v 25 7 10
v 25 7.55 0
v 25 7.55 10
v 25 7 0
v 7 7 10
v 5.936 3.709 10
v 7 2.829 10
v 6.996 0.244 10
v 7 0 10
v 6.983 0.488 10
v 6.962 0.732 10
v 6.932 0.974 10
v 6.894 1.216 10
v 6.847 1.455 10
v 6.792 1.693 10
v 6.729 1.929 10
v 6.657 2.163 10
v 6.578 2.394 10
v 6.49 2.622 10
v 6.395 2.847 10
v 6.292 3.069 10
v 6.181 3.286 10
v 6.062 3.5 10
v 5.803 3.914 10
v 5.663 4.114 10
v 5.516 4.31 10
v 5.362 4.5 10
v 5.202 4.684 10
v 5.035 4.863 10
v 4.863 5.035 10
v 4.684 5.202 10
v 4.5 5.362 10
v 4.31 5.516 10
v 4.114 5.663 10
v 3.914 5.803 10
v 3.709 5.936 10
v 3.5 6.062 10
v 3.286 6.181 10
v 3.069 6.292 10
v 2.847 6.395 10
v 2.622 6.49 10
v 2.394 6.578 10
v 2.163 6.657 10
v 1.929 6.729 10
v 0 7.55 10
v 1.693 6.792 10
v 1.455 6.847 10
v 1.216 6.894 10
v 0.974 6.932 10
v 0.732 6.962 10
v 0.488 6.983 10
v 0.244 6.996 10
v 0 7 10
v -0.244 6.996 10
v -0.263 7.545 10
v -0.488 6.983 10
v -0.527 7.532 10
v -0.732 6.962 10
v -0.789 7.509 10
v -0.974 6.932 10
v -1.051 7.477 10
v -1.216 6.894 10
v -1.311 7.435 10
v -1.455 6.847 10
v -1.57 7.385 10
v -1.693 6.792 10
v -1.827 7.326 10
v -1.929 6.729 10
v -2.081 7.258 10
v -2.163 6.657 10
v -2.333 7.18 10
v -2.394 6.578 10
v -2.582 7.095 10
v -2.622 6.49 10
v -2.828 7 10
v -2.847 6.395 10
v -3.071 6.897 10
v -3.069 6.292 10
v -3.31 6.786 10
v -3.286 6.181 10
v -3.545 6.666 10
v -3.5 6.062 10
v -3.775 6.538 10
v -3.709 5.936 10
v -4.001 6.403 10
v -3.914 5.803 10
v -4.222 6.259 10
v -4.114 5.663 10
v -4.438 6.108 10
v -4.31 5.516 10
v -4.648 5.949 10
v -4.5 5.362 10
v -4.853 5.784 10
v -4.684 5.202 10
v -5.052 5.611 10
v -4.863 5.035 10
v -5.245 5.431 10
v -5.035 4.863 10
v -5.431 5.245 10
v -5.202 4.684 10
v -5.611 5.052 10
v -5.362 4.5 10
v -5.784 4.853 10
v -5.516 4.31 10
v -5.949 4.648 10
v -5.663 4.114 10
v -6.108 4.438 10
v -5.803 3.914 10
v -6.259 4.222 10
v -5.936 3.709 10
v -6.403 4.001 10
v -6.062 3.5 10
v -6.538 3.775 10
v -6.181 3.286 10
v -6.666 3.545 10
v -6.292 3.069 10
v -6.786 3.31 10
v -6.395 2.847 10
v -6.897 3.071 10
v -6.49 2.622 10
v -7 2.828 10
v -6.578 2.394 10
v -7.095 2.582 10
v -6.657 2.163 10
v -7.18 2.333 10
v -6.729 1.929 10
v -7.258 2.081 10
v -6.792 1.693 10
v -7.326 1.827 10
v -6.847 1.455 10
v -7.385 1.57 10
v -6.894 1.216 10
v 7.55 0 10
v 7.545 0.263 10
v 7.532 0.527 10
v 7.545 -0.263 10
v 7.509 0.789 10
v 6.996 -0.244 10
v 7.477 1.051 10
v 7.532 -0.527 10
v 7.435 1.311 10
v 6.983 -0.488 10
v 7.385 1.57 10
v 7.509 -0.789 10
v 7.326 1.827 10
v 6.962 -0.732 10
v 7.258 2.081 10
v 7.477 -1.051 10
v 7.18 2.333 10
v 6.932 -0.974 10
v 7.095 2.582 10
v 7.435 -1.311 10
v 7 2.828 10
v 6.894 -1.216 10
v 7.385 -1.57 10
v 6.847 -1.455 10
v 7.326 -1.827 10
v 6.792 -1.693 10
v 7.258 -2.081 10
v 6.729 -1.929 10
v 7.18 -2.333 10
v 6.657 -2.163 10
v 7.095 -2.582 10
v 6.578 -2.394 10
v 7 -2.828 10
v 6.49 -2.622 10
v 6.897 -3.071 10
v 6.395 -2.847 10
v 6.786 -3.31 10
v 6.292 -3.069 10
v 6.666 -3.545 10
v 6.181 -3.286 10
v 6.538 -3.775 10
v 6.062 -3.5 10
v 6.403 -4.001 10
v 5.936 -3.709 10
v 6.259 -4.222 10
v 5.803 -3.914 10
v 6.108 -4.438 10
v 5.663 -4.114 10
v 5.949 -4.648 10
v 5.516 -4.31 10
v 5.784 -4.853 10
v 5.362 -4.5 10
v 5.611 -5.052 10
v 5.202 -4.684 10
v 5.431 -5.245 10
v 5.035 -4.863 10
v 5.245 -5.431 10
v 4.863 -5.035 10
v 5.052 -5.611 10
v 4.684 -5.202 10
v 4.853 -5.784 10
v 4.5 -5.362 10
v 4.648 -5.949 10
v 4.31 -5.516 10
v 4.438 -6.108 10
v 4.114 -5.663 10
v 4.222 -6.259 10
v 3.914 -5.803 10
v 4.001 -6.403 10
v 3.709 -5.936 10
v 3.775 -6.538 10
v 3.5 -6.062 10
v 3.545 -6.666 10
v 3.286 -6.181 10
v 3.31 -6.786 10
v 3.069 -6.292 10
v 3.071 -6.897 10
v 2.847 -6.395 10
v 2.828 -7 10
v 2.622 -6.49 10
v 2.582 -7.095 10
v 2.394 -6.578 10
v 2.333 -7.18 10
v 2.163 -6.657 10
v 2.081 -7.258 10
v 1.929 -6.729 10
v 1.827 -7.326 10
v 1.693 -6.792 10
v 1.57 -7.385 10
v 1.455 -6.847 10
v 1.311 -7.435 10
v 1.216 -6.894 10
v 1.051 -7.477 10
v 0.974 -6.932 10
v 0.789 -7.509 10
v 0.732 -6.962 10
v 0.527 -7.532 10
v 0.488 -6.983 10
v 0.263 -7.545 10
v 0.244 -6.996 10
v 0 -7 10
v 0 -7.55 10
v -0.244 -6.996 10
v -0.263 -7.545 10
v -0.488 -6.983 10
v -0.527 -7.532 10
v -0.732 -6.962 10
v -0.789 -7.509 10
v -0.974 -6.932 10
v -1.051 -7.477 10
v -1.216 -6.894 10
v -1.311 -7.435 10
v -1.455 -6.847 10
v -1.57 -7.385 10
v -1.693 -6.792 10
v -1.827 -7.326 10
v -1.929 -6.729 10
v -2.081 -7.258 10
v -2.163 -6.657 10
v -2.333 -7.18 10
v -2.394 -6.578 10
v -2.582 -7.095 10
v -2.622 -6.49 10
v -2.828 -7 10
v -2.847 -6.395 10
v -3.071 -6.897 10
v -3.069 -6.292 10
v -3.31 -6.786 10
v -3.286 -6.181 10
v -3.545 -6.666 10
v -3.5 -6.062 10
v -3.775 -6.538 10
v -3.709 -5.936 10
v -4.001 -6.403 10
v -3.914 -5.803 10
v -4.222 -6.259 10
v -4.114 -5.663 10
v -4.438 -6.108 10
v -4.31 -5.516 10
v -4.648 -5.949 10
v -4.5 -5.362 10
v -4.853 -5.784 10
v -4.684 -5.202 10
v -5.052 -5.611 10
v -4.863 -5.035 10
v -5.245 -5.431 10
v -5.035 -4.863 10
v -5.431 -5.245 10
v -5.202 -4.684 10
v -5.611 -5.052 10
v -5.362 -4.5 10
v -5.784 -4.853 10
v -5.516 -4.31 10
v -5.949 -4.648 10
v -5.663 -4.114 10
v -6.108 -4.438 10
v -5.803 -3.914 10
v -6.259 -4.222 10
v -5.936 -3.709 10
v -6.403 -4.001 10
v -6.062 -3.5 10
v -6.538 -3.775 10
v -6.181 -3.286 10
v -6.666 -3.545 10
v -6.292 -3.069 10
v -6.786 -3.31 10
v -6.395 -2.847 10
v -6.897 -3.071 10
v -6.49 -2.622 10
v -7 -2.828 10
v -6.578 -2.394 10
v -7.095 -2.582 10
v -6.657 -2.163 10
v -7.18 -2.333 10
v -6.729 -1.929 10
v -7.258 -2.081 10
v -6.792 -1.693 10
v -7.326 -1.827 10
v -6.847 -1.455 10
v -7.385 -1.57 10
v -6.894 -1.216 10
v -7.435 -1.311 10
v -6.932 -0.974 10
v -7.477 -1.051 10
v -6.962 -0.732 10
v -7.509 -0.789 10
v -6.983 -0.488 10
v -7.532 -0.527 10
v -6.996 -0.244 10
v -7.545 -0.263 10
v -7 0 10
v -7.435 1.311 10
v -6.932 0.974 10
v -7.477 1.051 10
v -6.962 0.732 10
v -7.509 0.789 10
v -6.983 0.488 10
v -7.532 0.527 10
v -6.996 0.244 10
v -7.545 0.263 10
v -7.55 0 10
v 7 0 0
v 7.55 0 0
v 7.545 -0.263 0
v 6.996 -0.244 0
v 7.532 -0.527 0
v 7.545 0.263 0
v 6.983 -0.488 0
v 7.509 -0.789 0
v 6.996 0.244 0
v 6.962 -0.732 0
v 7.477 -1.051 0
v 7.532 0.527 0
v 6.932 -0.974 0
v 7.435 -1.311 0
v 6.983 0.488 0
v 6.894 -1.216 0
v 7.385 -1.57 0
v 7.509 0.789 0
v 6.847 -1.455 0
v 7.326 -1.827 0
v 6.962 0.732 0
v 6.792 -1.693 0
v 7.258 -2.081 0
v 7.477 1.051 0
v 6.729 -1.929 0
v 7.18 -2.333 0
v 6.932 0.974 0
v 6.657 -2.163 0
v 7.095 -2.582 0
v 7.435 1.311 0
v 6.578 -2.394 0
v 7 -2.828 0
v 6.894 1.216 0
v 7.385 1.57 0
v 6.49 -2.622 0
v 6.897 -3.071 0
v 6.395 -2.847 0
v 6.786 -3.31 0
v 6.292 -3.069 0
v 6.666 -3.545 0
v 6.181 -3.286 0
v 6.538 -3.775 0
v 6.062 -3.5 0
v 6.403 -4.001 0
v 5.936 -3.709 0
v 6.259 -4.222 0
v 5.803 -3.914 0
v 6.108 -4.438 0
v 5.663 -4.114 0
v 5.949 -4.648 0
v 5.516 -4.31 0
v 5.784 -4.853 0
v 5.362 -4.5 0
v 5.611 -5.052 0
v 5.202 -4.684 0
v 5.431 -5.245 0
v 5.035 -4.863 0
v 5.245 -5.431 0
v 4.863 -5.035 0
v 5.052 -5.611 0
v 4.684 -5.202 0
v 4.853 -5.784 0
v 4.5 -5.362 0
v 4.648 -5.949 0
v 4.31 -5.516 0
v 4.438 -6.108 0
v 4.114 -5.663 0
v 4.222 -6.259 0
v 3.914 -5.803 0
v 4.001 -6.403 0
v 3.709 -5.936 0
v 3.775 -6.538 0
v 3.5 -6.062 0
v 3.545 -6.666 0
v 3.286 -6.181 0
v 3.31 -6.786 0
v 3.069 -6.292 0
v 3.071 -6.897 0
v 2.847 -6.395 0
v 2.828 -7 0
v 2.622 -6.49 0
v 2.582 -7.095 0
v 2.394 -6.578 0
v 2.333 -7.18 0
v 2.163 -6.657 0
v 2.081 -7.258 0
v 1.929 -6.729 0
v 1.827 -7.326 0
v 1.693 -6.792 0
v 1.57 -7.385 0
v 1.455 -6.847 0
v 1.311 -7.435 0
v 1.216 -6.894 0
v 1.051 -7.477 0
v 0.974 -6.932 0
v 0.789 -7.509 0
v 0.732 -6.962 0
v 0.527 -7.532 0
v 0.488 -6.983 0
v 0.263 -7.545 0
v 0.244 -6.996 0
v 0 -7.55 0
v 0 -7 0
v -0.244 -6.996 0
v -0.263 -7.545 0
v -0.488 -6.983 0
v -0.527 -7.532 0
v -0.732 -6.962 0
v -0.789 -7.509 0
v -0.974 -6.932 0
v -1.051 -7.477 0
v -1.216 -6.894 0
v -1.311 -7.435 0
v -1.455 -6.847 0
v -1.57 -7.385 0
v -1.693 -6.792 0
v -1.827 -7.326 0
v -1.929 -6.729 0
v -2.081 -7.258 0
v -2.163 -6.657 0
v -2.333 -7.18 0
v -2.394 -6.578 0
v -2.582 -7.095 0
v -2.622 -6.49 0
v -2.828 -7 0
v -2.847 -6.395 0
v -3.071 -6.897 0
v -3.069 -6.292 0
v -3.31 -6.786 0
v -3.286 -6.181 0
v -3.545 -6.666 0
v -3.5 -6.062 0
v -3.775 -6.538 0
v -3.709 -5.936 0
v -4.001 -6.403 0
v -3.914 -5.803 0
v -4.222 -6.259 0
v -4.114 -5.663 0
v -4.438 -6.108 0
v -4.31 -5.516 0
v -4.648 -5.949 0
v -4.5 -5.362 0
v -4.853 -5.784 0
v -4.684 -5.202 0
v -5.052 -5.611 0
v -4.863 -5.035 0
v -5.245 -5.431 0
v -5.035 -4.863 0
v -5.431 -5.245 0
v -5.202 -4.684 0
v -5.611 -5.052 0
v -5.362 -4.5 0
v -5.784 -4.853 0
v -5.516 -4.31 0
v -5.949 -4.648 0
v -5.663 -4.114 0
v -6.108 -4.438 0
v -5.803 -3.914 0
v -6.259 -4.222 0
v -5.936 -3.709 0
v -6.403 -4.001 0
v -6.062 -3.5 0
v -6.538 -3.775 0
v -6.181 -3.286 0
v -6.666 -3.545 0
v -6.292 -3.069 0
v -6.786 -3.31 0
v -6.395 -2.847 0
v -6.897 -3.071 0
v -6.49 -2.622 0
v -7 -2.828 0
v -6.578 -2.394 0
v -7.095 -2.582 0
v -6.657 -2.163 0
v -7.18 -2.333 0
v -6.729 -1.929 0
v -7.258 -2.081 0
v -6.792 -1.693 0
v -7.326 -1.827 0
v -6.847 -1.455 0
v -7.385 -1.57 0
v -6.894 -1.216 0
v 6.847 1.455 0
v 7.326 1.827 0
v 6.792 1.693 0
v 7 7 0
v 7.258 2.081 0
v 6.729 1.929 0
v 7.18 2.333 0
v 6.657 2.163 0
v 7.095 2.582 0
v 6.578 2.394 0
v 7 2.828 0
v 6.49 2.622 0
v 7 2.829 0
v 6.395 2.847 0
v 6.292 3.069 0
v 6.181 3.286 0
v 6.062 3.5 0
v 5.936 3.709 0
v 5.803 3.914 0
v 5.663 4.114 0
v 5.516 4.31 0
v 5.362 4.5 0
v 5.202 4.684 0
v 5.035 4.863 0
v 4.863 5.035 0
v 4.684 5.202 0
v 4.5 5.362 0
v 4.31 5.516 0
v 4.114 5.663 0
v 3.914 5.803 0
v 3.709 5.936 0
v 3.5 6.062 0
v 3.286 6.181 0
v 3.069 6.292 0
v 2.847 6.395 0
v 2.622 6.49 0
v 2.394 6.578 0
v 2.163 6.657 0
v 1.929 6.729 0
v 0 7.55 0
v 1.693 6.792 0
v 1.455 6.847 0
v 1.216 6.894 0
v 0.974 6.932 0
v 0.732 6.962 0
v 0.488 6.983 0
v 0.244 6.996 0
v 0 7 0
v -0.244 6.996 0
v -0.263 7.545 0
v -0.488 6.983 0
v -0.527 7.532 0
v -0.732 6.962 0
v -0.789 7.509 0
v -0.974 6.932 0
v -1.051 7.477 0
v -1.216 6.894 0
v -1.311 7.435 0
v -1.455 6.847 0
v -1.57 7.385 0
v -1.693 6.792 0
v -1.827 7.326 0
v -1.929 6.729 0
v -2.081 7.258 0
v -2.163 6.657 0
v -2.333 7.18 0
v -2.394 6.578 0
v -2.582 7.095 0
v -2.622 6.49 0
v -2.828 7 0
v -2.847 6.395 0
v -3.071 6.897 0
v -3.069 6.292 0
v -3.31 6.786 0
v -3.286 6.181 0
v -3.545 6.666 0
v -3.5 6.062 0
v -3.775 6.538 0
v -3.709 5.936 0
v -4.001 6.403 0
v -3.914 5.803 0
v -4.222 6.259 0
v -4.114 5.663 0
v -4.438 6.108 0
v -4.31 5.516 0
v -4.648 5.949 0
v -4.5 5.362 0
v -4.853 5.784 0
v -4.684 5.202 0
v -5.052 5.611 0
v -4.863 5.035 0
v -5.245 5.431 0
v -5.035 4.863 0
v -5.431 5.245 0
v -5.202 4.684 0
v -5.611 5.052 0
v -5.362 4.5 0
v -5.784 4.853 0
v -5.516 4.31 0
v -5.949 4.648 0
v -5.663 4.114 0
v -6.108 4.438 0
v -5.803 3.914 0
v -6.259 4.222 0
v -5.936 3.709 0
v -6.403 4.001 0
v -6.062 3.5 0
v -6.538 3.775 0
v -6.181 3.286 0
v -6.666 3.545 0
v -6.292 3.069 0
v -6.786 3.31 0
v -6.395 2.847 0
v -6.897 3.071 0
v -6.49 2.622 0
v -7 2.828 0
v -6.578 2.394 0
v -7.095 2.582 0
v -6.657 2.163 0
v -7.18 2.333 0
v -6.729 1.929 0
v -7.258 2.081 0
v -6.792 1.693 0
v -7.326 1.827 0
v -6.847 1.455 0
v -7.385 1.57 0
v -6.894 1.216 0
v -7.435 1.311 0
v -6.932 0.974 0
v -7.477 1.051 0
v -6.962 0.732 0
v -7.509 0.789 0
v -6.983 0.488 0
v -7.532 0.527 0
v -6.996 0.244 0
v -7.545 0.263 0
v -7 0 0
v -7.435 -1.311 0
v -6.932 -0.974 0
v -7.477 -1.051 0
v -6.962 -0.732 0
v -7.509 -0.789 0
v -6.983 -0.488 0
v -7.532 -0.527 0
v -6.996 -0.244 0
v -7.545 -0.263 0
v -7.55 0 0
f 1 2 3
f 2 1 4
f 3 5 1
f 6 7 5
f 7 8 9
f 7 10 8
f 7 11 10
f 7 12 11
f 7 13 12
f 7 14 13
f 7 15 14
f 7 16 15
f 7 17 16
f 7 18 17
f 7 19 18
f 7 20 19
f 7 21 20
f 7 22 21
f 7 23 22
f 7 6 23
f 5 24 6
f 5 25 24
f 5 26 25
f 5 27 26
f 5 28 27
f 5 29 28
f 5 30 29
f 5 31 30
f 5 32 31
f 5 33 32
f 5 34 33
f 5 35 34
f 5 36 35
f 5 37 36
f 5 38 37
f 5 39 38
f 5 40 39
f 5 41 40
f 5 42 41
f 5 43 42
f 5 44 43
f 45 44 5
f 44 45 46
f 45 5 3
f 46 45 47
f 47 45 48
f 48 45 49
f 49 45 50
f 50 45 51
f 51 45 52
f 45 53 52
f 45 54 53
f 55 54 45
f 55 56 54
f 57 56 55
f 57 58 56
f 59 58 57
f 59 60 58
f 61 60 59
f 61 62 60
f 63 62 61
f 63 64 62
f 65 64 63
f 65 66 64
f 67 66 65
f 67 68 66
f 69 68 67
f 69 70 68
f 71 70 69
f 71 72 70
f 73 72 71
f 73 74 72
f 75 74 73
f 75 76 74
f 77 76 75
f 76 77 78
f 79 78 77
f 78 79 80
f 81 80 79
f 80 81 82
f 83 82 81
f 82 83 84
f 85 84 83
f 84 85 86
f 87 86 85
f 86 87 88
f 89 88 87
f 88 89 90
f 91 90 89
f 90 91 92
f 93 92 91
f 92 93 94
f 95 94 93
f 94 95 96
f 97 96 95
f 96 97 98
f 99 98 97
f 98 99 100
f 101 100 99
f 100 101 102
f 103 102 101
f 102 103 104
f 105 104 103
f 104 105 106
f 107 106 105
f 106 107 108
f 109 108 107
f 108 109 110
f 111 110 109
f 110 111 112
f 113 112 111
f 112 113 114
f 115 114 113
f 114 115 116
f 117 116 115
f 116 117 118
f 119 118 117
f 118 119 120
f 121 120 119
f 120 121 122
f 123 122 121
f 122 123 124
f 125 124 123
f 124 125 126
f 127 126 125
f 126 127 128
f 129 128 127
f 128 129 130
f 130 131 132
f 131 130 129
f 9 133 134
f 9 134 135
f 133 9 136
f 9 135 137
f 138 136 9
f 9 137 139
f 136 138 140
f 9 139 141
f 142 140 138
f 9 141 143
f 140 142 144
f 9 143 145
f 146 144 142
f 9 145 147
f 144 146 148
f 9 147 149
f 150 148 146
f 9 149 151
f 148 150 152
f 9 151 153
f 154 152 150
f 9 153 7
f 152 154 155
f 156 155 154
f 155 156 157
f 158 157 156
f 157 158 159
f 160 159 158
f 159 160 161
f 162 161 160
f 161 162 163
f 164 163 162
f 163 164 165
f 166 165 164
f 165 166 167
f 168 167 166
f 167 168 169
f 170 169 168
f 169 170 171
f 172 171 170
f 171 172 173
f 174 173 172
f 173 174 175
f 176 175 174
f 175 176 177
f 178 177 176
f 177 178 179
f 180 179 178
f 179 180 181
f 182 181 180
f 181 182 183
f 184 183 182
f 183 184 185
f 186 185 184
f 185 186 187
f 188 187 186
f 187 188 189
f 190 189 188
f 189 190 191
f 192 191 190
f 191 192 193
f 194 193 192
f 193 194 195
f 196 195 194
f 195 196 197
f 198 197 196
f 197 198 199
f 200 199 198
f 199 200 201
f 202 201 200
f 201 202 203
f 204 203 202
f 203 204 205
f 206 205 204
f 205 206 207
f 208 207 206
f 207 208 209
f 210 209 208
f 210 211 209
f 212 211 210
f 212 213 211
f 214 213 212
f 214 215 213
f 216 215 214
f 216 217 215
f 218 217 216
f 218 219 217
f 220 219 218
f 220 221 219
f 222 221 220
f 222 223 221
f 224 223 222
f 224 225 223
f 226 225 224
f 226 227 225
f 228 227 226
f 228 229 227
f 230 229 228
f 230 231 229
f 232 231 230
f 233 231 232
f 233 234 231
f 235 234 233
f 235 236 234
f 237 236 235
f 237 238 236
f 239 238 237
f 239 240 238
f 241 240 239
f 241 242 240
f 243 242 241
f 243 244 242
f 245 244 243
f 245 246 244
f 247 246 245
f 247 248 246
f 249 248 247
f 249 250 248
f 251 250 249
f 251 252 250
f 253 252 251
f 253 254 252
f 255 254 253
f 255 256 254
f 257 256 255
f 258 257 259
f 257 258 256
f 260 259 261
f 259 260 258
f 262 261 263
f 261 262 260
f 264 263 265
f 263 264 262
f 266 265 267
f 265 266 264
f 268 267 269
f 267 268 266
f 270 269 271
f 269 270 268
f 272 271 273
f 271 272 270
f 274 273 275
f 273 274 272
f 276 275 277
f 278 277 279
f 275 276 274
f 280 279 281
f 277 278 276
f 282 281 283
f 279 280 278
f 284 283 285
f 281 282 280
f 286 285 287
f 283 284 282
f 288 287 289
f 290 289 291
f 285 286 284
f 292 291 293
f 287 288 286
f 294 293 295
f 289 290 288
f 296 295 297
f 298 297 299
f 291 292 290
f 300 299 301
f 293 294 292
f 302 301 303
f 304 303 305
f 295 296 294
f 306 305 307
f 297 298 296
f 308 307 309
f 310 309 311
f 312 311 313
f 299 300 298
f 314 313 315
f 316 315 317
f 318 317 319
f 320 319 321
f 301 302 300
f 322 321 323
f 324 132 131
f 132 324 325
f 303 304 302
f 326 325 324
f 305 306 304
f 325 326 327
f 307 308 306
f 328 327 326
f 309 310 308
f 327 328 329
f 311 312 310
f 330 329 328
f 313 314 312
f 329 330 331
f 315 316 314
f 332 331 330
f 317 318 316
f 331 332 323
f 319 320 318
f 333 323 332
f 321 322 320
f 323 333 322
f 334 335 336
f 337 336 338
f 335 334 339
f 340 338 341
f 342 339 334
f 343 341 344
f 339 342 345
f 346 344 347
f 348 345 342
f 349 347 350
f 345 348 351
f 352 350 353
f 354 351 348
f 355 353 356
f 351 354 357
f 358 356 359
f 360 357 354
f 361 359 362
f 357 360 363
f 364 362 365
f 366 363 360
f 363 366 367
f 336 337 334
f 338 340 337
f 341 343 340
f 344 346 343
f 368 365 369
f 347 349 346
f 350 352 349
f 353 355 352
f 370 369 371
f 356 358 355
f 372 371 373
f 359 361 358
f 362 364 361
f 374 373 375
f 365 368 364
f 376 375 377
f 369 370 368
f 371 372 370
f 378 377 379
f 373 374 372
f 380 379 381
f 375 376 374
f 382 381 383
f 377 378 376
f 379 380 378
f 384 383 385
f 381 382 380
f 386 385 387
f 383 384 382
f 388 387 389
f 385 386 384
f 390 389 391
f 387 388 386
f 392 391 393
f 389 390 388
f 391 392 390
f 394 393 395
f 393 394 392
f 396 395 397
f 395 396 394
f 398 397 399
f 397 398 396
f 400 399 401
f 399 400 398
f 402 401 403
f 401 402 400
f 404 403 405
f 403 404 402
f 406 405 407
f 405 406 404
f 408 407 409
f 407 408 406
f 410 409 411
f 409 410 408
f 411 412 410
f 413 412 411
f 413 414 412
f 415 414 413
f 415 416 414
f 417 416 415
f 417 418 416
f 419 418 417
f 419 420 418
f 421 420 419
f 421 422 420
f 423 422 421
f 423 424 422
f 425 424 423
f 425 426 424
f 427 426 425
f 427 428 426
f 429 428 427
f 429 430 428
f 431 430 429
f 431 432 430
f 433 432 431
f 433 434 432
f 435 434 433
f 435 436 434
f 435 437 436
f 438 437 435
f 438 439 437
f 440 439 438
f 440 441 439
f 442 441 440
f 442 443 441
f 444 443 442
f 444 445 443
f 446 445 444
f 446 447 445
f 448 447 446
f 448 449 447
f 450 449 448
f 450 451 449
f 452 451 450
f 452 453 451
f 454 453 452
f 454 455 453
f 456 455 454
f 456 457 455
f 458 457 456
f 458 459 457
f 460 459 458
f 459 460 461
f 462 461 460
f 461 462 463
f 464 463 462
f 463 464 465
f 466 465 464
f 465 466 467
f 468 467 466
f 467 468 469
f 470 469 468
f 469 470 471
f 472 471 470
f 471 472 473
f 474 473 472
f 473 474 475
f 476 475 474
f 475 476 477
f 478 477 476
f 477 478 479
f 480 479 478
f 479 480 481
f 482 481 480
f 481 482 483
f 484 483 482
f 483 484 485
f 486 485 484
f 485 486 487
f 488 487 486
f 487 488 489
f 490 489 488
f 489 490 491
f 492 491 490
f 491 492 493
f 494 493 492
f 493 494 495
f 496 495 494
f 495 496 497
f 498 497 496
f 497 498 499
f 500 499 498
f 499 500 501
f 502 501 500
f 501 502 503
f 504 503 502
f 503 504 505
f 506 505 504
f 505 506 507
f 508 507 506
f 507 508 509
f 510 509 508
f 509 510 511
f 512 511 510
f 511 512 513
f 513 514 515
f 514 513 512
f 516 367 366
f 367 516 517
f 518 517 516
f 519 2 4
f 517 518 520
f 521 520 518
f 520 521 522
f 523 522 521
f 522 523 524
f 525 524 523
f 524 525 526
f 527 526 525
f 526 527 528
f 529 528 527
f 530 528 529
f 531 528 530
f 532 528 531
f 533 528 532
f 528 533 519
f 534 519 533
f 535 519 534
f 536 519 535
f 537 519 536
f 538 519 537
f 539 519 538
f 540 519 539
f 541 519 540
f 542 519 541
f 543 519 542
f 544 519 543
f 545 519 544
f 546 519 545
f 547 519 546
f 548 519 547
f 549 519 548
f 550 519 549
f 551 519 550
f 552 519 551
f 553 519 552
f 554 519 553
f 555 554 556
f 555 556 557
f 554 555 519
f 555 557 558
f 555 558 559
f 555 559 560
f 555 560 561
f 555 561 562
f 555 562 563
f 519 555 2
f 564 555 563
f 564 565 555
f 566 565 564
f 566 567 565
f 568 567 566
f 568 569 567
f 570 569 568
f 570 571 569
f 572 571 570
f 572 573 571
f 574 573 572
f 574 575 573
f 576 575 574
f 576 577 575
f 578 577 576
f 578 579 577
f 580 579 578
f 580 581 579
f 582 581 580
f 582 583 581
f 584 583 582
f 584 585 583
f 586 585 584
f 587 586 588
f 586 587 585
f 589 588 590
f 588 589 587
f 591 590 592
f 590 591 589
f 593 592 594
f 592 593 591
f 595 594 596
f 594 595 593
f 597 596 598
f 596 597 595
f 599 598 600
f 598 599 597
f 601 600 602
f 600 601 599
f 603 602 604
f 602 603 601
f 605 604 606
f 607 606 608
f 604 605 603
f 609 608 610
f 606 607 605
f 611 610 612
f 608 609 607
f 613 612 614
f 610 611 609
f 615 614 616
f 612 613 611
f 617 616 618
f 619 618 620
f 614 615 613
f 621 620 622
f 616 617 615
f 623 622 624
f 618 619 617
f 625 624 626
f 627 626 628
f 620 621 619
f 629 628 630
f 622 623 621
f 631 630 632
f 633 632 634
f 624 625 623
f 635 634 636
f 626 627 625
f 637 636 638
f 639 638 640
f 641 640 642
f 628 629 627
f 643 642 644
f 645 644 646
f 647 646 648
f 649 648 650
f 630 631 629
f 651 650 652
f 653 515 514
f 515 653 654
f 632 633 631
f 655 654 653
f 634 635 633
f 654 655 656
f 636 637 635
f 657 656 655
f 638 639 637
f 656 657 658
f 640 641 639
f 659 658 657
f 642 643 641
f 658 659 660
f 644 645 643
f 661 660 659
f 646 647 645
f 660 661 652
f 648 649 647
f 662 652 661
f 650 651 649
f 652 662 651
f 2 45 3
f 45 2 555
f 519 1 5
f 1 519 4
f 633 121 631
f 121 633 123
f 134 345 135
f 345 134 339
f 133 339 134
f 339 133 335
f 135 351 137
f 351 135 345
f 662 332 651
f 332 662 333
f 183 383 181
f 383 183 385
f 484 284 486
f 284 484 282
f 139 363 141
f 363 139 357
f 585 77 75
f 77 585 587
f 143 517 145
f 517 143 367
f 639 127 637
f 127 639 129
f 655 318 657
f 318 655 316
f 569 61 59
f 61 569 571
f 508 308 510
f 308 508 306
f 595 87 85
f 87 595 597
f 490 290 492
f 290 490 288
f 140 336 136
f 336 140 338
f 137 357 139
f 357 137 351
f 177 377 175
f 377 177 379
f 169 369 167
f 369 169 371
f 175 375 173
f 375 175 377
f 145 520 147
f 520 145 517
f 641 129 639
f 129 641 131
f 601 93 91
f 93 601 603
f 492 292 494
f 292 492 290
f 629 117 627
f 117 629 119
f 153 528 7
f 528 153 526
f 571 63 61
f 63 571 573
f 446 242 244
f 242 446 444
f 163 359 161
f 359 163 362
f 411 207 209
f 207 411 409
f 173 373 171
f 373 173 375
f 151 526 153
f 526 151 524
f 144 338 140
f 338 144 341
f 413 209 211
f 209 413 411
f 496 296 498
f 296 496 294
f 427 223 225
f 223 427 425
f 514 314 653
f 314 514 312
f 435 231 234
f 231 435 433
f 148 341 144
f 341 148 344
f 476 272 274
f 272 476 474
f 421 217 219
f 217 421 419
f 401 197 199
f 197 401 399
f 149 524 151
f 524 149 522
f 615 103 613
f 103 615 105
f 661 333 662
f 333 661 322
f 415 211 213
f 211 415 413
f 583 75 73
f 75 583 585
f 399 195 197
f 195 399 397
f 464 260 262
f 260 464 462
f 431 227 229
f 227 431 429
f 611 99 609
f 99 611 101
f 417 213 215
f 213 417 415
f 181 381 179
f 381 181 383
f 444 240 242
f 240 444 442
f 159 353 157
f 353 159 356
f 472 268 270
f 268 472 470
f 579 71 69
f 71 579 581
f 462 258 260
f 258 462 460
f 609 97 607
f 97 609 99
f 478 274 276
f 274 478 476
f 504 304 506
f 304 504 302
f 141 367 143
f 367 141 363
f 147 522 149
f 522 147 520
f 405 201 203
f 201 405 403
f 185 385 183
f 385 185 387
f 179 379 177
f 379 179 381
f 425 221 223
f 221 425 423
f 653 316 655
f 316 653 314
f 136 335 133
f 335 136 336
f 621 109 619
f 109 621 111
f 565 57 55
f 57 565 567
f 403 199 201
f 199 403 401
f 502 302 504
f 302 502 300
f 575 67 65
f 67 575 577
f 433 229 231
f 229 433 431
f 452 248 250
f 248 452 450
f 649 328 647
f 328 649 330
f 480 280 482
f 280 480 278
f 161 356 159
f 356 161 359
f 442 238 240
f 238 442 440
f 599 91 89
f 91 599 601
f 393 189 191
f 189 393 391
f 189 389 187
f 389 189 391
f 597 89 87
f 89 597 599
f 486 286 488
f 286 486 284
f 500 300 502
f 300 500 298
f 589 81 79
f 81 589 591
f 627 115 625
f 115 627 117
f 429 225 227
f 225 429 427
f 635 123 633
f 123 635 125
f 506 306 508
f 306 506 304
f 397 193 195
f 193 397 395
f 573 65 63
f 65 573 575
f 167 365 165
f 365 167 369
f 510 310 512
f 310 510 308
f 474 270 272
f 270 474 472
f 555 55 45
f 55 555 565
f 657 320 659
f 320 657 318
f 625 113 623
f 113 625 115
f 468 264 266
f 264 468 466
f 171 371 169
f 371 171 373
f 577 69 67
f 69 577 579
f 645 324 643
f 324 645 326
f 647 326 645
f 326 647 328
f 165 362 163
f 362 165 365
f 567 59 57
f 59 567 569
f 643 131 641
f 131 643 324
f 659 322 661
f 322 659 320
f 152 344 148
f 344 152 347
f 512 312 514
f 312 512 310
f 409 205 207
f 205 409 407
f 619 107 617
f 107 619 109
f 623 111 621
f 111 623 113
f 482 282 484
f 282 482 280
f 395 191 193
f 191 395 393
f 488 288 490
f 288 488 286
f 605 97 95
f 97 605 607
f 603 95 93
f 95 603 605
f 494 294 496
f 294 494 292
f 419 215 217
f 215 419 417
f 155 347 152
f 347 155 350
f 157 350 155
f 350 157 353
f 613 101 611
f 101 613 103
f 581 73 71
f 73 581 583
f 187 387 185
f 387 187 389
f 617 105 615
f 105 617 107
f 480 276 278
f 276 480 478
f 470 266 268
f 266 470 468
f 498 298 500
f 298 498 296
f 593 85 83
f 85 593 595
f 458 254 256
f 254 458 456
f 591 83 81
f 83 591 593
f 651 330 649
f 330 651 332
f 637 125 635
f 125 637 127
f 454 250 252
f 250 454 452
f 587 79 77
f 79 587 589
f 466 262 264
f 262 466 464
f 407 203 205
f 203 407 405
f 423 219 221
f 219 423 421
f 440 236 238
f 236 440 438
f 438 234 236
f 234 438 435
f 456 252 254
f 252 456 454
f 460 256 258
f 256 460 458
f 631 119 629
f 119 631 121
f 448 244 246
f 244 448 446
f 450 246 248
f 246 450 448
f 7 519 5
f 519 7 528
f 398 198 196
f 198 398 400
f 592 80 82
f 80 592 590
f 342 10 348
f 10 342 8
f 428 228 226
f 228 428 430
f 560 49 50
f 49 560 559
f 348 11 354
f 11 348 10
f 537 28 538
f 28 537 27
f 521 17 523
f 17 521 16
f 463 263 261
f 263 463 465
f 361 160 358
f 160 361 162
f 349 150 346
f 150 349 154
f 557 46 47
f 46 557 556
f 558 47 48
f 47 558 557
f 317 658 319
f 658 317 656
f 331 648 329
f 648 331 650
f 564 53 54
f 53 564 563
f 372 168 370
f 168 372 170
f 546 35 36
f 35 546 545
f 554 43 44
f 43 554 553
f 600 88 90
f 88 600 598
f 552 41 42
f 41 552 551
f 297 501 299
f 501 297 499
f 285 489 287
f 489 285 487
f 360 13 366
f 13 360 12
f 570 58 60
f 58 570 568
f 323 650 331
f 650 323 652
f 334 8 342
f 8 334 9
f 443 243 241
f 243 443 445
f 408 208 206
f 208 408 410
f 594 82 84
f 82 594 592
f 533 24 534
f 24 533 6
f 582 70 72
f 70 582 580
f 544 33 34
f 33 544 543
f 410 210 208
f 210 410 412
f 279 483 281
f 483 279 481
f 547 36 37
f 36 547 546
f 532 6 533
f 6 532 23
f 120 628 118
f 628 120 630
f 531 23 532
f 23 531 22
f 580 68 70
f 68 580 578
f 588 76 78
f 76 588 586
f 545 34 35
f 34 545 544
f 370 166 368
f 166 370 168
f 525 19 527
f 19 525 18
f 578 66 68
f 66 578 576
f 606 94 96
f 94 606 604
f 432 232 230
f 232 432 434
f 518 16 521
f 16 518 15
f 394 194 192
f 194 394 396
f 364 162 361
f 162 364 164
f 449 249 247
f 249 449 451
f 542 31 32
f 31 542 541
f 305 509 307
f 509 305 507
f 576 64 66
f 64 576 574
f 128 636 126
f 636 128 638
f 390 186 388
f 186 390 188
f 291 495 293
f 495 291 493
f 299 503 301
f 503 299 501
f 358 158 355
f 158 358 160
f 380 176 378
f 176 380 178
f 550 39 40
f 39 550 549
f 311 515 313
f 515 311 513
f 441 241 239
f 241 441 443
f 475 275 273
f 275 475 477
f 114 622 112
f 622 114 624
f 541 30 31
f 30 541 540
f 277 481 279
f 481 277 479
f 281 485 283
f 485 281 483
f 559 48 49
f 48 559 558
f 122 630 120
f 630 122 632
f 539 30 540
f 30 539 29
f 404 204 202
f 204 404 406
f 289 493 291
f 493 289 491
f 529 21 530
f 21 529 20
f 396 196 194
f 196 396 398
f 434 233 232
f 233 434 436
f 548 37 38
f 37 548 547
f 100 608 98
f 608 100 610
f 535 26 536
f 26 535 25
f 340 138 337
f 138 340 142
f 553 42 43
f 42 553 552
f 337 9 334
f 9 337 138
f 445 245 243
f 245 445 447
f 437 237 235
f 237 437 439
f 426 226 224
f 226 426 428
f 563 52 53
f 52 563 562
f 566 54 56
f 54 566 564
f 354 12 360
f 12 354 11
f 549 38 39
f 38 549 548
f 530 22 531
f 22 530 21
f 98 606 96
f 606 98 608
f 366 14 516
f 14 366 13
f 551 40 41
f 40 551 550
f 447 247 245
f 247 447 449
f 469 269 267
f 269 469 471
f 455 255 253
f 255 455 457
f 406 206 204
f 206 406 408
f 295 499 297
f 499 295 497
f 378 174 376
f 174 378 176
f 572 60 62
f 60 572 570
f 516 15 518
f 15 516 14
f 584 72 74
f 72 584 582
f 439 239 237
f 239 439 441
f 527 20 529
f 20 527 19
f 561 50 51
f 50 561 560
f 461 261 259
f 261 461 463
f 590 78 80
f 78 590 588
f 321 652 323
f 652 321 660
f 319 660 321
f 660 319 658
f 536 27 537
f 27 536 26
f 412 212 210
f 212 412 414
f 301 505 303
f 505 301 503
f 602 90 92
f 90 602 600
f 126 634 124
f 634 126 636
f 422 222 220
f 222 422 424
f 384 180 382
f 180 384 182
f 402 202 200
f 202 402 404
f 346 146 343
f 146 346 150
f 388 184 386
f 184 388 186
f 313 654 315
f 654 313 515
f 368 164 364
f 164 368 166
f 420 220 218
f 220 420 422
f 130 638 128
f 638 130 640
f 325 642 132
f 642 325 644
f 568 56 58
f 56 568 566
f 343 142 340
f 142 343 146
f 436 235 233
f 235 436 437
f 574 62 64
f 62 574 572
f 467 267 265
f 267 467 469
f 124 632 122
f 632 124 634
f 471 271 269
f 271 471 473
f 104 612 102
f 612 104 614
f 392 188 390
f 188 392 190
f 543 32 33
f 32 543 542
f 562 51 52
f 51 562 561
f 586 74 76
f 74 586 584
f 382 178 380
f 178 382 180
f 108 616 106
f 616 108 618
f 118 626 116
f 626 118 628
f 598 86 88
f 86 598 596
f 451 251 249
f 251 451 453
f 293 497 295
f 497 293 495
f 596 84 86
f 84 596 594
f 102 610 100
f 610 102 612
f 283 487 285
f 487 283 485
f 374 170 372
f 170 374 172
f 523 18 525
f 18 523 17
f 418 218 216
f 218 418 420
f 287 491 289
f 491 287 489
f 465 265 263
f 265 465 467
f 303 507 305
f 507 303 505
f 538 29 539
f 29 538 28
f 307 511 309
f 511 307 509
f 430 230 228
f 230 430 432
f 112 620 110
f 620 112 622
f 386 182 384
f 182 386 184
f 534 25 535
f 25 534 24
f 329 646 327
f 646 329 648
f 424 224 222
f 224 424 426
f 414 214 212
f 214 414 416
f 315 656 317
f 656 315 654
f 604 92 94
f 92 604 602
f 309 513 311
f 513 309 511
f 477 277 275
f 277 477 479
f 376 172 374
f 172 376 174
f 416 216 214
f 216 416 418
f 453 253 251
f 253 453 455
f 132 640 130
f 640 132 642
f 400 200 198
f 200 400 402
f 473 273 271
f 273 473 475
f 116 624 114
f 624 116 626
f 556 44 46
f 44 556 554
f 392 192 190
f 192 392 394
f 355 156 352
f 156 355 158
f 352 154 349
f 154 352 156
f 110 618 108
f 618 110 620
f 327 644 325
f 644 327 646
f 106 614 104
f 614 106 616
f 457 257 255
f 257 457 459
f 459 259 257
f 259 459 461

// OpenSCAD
//Copyright Hsiao-yu Chen 2016

//Pen Loop, Style 1



//model for a simple pen loop for notebooks and journals.
//


// 
// Designed #1: for simple mounting on front of back covers of a notebook. 

//Parameters:

//height: the length of pen section to hold
height = 10;

//inner_dia : should be the diameter of pen with a bit of slack
inner_dia = 14;
//thickness : thickness of both tab and loop
thickness = 1.1;
//tab_width : how wide the tab is
tab_width = 25;


module pen_loop_1(height, inner_dia, thickness, tab_width, smoothness = 180){
    radius = inner_dia / 2.0;
    

    difference(){
        union () {
            //a tab to attach to paper
            translate([0, radius, 0])
                cube(size =[tab_width, thickness / 2.0, height]);
      
            //main body cylindar
            cylinder($fn=smoothness, h=height, d=inner_dia+thickness);
            
            //fillet
            translate([0,0 ,0]) cube(size=[radius, inner_dia / 2.0, height]);
        }; //union
        
        //hallow out inner_diameter cylindar
        cylinder($fn=smoothness,  h=height, d=inner_dia);
        };
} //module
        


//Examples:
//LAMY Safari butt
//pen_loop_1(10, 13, 1.1, 25, 180);
//LAMY Safari Cap:
//pen_loop_1(10, 15, 1.1, 25, 180);

//Rotring Artpen cap
//pen_loop_1(35, 14, 1.1, 25, 180);

pen_loop_1(height, inner_dia, thickness,tab_width);
